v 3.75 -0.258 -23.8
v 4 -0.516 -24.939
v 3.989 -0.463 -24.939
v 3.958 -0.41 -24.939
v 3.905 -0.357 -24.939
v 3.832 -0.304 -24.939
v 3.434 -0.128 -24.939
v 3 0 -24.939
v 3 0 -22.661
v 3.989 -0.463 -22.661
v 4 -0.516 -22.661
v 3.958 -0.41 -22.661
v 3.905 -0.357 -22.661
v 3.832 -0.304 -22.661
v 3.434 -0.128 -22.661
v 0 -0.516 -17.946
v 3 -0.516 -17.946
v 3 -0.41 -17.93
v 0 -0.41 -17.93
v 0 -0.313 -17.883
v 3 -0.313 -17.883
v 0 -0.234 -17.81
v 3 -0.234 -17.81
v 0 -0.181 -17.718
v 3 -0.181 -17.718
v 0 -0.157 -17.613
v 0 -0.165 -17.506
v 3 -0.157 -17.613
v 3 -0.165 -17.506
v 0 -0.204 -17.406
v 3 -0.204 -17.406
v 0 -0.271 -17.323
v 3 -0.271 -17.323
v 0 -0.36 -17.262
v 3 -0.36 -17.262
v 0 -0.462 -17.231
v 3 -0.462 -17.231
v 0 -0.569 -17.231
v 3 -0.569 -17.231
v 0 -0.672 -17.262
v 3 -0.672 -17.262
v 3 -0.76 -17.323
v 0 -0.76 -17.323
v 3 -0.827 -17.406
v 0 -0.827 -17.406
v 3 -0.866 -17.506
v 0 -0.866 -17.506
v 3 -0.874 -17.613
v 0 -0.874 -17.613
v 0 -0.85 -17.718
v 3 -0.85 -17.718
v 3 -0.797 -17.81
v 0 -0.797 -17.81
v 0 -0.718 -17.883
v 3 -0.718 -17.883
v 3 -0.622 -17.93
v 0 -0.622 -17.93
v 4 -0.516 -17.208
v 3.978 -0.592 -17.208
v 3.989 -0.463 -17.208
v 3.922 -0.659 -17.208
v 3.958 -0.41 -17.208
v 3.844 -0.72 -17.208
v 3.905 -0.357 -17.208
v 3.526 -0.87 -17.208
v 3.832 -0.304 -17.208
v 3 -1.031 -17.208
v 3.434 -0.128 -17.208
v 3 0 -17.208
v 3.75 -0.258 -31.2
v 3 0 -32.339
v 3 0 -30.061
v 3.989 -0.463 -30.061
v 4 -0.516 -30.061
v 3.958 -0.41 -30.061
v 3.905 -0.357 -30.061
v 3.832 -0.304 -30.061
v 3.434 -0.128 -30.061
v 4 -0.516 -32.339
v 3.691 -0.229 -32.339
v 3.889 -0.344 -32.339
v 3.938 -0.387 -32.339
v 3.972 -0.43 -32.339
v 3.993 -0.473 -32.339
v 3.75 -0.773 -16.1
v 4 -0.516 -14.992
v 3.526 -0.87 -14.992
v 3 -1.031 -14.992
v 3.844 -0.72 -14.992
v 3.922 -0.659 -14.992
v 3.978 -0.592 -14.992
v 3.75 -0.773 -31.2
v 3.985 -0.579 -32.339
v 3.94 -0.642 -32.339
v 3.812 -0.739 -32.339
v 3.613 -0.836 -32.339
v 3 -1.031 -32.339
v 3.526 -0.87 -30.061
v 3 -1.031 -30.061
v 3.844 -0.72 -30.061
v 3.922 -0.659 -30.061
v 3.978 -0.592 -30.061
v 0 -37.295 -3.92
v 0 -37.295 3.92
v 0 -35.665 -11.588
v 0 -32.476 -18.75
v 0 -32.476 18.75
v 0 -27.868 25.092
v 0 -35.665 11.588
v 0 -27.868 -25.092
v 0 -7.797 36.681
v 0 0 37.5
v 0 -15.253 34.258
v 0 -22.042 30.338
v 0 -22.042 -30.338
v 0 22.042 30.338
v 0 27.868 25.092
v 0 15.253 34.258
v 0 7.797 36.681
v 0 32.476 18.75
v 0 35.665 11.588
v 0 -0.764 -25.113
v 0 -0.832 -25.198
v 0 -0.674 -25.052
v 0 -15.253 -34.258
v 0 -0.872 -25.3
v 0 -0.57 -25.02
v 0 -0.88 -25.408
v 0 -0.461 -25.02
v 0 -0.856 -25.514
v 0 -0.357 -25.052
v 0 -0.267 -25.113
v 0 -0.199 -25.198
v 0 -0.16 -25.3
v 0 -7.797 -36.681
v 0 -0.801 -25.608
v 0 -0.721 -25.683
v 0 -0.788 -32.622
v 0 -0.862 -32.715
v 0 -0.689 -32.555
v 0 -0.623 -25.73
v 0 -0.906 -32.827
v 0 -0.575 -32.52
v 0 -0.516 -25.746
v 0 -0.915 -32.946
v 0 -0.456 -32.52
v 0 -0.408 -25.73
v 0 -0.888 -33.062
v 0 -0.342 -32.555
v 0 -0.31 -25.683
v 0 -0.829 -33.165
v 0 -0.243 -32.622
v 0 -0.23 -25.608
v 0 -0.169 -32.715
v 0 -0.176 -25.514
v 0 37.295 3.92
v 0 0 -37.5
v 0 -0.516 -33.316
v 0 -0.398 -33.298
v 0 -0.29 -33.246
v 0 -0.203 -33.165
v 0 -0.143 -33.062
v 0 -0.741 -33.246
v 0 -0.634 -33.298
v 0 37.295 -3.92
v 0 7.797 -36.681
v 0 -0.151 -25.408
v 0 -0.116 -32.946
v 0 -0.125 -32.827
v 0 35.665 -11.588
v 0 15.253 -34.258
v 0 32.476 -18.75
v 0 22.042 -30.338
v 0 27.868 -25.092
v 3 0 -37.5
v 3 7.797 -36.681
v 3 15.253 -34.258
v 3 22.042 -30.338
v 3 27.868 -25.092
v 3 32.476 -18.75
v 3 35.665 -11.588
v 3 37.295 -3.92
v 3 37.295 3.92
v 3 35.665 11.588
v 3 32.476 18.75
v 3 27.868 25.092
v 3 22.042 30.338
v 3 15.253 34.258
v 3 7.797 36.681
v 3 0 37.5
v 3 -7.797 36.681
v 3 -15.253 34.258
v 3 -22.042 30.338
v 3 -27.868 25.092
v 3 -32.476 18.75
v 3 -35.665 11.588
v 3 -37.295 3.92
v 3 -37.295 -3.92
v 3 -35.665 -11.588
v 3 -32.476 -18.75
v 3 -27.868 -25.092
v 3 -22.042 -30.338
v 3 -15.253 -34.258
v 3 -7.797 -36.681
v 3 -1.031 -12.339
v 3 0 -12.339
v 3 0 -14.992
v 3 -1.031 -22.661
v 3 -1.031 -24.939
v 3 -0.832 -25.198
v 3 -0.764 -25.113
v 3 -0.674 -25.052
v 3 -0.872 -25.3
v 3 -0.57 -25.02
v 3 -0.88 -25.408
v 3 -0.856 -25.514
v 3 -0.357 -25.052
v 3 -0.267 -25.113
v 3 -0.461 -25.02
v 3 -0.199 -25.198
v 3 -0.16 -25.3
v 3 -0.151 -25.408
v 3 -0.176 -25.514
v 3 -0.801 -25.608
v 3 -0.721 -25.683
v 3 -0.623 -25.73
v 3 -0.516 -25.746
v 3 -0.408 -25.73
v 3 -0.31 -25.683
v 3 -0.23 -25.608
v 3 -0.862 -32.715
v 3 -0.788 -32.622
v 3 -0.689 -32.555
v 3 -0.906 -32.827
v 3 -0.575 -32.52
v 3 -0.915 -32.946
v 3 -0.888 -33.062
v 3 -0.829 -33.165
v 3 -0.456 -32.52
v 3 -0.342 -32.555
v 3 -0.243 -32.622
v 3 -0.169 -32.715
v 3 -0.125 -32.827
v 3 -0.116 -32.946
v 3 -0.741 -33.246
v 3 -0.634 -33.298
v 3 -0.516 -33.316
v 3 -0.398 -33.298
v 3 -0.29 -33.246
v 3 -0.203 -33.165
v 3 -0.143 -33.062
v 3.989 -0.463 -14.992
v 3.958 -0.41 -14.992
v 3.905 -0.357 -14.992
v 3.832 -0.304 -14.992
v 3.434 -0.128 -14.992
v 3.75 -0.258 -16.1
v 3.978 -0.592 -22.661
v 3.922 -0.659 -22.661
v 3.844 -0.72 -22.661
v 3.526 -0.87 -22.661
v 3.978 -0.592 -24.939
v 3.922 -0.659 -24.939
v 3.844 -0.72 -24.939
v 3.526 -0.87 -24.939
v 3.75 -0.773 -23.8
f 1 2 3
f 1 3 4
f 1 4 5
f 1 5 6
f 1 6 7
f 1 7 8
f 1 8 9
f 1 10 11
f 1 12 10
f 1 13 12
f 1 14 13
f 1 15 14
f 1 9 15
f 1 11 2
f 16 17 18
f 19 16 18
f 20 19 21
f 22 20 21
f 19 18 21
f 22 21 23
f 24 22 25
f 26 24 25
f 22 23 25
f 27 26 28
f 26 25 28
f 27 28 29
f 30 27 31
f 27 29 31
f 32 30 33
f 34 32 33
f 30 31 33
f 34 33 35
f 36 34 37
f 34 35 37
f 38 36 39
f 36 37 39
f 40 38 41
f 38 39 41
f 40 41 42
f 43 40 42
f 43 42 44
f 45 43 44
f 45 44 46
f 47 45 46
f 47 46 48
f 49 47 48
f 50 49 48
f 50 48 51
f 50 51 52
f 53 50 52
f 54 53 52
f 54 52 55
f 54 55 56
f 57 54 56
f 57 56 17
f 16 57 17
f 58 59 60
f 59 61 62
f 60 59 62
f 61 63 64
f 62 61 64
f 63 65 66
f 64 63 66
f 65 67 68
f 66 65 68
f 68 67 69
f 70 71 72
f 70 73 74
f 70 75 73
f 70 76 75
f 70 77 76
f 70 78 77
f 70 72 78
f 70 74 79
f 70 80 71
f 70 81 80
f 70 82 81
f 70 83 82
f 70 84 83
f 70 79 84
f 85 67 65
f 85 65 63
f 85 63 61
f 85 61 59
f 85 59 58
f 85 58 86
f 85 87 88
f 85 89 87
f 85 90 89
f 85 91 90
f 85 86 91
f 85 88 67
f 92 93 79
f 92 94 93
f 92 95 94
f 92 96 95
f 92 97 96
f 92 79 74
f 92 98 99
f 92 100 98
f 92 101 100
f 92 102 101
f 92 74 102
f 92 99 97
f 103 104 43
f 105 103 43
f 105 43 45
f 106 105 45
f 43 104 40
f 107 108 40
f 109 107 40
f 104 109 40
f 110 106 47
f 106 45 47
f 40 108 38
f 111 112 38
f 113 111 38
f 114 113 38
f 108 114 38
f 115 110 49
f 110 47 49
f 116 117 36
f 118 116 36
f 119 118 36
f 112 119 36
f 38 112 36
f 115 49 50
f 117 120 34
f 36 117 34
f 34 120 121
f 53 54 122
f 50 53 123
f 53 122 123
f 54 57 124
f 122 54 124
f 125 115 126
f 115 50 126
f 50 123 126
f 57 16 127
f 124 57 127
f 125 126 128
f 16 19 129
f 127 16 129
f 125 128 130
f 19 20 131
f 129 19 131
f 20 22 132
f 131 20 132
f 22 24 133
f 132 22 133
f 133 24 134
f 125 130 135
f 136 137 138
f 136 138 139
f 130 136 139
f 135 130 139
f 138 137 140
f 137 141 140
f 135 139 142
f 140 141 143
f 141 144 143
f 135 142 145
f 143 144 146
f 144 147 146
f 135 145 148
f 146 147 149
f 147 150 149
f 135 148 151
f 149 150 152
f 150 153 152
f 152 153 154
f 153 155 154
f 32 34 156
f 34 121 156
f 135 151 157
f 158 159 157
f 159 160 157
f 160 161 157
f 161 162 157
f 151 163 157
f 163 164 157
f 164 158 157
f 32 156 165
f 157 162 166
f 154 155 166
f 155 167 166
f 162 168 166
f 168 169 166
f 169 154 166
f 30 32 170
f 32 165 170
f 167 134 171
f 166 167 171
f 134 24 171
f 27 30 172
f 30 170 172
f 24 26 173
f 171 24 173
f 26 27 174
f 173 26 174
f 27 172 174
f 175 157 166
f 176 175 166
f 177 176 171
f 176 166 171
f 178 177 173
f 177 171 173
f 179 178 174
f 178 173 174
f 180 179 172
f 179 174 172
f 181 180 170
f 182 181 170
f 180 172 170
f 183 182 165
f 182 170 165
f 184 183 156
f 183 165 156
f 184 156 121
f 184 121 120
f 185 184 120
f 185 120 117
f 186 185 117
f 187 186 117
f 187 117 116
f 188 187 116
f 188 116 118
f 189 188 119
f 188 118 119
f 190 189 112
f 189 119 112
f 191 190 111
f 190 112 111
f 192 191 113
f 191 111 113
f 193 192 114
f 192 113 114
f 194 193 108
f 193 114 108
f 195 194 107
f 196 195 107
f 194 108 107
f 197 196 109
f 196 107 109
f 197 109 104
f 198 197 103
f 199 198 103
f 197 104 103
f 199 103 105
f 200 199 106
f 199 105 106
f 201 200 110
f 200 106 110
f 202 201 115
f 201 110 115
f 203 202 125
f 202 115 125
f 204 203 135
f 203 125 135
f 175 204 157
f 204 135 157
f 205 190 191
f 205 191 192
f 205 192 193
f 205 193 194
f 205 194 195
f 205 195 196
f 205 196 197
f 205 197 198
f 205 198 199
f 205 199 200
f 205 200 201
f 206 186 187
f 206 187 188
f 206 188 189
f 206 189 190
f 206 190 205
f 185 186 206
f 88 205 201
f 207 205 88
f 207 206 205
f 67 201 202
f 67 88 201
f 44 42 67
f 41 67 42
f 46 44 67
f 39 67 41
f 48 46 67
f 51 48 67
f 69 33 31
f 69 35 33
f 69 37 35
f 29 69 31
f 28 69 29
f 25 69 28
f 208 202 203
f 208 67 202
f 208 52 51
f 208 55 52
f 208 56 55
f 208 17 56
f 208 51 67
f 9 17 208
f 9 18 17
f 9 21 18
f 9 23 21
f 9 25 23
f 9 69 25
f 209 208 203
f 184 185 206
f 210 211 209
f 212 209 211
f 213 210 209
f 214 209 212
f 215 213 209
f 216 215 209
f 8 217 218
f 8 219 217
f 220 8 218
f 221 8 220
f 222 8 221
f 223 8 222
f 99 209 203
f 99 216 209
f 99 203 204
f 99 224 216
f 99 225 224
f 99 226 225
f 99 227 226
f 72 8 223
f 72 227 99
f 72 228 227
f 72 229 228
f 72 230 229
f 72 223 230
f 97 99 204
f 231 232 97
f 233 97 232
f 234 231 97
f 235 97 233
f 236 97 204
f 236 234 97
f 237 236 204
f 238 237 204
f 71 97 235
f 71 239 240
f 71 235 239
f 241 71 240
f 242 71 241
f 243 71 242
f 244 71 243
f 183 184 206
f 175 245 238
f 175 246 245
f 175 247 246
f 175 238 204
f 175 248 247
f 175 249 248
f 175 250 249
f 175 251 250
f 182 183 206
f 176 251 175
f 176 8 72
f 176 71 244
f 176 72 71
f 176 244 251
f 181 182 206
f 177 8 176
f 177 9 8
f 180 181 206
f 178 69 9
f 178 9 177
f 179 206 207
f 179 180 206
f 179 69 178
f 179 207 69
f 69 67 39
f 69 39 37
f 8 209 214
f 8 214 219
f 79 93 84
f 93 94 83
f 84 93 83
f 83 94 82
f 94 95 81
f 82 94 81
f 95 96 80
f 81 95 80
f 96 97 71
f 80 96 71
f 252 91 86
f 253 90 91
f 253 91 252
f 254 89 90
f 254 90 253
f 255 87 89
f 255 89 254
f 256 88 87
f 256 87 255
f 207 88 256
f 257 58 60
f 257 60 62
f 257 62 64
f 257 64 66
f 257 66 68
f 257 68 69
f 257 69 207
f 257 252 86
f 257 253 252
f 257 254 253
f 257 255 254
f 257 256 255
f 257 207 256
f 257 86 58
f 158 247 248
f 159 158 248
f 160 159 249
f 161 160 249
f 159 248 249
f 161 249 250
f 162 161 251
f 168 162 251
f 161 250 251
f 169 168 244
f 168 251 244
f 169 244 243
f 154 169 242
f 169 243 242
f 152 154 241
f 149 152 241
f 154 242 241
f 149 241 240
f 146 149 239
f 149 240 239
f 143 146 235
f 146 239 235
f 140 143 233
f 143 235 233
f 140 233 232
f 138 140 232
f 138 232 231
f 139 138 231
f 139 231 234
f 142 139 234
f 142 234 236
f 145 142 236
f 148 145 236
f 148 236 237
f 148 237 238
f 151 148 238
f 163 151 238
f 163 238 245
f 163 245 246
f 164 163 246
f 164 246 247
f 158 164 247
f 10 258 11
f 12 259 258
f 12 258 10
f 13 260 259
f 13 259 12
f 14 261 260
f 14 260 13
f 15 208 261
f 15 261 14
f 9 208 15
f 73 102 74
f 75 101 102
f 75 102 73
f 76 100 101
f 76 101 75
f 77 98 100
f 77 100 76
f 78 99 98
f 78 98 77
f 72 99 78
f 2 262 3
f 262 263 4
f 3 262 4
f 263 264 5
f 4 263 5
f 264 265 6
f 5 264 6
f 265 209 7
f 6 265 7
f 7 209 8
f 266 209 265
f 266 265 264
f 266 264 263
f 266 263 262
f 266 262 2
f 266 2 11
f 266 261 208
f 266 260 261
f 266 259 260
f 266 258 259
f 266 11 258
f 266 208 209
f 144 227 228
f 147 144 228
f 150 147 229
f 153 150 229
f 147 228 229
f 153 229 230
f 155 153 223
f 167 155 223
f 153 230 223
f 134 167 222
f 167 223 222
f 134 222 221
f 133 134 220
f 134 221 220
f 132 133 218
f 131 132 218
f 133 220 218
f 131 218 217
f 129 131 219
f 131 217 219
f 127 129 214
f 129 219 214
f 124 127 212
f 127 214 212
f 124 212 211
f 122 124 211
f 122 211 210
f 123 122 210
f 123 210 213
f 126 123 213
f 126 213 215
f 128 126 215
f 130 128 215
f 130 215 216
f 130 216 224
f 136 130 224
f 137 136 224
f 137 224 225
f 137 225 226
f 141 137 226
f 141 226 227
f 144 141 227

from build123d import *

# Parameters (mm, degrees)
CROQUIS1_R              = 37.5
SALIENTE_EXTRUIR1_DEPTH = 3
CROQUIS3_W              = 2.216229218
CROQUIS3_H              = 1.031247755
CROQUIS3_W_2            = 2.277685896
SALIENTE_EXTRUIR2_DEPTH = 1
CORTAR_EXTRUIR1_DEPTH   = 20
CROQUIS5_R              = 0.35967939
CROQUIS5_R_2            = 0.365171254
CROQUIS5_R_3            = 0.400306504
CORTAR_EXTRUIR2_DEPTH   = 20


with BuildPart() as part:
    # Croquis1 → Saliente-Extruir1 (new body)
    with BuildSketch(Plane(origin=(0, 0, 0), x_dir=(0, 0, -1), z_dir=(1, 0, 0))):
        Circle(CROQUIS1_R)
    extrude(amount=SALIENTE_EXTRUIR1_DEPTH)

    # Croquis3 → Saliente-Extruir2 (add)
    with BuildSketch(Plane(origin=(3, 0, 0), x_dir=(0, 0, -1), z_dir=(1, 0, 0))):
        with Locations((16.1, -0.515623878)):
            Rectangle(CROQUIS3_W, CROQUIS3_H)
        with Locations((23.8, -0.515623878)):
            Rectangle(CROQUIS3_W_2, CROQUIS3_H)
        with Locations((31.2, -0.515623878)):
            Rectangle(CROQUIS3_W_2, CROQUIS3_H)
    extrude(amount=SALIENTE_EXTRUIR2_DEPTH)

    # Croquis4 → Cortar-Extruir1 (cut)
    with BuildSketch(Plane(origin=(0, 0, -32.338842948), x_dir=(-1, 0, 0), z_dir=(0, 0, -1))):
        with BuildLine():
            add(Edge.make_bspline(
                [(-3, 0), (-4, -0.257811939), (-4, -0.515623877)],
                knots=[0, 0, 0, 0.5, 0.5, 0.5], degree=2))
            Line((-3, 0), (-4, 0))
            Line((-4, 0), (-4, -0.515623877))
        make_face()
        with BuildLine():
            Line((-4, -1.031247755), (-3, -1.031247755))
            add(Edge.make_bspline(
                [(-4, -0.515623877), (-4, -0.773435816), (-3, -1.031247755)],
                knots=[0.5, 0.5, 0.5, 1, 1, 1], degree=2))
            Line((-4, -0.515623877), (-4, -1.031247755))
        make_face()
    extrude(amount=-CORTAR_EXTRUIR1_DEPTH, mode=Mode.SUBTRACT)

    # Croquis5 → Cortar-Extruir2 (cut)
    with BuildSketch(Plane(origin=(3, 0, 0), x_dir=(0, 0, -1), z_dir=(1, 0, 0))):
        with Locations((17.58621928, -0.515623877)):
            Circle(CROQUIS5_R)
        with Locations((25.380798287, -0.515623877)):
            Circle(CROQUIS5_R_2)
        with Locations((32.915617677, -0.515623877)):
            Circle(CROQUIS5_R_3)
    extrude(amount=-CORTAR_EXTRUIR2_DEPTH, mode=Mode.SUBTRACT)


solid = part.part
